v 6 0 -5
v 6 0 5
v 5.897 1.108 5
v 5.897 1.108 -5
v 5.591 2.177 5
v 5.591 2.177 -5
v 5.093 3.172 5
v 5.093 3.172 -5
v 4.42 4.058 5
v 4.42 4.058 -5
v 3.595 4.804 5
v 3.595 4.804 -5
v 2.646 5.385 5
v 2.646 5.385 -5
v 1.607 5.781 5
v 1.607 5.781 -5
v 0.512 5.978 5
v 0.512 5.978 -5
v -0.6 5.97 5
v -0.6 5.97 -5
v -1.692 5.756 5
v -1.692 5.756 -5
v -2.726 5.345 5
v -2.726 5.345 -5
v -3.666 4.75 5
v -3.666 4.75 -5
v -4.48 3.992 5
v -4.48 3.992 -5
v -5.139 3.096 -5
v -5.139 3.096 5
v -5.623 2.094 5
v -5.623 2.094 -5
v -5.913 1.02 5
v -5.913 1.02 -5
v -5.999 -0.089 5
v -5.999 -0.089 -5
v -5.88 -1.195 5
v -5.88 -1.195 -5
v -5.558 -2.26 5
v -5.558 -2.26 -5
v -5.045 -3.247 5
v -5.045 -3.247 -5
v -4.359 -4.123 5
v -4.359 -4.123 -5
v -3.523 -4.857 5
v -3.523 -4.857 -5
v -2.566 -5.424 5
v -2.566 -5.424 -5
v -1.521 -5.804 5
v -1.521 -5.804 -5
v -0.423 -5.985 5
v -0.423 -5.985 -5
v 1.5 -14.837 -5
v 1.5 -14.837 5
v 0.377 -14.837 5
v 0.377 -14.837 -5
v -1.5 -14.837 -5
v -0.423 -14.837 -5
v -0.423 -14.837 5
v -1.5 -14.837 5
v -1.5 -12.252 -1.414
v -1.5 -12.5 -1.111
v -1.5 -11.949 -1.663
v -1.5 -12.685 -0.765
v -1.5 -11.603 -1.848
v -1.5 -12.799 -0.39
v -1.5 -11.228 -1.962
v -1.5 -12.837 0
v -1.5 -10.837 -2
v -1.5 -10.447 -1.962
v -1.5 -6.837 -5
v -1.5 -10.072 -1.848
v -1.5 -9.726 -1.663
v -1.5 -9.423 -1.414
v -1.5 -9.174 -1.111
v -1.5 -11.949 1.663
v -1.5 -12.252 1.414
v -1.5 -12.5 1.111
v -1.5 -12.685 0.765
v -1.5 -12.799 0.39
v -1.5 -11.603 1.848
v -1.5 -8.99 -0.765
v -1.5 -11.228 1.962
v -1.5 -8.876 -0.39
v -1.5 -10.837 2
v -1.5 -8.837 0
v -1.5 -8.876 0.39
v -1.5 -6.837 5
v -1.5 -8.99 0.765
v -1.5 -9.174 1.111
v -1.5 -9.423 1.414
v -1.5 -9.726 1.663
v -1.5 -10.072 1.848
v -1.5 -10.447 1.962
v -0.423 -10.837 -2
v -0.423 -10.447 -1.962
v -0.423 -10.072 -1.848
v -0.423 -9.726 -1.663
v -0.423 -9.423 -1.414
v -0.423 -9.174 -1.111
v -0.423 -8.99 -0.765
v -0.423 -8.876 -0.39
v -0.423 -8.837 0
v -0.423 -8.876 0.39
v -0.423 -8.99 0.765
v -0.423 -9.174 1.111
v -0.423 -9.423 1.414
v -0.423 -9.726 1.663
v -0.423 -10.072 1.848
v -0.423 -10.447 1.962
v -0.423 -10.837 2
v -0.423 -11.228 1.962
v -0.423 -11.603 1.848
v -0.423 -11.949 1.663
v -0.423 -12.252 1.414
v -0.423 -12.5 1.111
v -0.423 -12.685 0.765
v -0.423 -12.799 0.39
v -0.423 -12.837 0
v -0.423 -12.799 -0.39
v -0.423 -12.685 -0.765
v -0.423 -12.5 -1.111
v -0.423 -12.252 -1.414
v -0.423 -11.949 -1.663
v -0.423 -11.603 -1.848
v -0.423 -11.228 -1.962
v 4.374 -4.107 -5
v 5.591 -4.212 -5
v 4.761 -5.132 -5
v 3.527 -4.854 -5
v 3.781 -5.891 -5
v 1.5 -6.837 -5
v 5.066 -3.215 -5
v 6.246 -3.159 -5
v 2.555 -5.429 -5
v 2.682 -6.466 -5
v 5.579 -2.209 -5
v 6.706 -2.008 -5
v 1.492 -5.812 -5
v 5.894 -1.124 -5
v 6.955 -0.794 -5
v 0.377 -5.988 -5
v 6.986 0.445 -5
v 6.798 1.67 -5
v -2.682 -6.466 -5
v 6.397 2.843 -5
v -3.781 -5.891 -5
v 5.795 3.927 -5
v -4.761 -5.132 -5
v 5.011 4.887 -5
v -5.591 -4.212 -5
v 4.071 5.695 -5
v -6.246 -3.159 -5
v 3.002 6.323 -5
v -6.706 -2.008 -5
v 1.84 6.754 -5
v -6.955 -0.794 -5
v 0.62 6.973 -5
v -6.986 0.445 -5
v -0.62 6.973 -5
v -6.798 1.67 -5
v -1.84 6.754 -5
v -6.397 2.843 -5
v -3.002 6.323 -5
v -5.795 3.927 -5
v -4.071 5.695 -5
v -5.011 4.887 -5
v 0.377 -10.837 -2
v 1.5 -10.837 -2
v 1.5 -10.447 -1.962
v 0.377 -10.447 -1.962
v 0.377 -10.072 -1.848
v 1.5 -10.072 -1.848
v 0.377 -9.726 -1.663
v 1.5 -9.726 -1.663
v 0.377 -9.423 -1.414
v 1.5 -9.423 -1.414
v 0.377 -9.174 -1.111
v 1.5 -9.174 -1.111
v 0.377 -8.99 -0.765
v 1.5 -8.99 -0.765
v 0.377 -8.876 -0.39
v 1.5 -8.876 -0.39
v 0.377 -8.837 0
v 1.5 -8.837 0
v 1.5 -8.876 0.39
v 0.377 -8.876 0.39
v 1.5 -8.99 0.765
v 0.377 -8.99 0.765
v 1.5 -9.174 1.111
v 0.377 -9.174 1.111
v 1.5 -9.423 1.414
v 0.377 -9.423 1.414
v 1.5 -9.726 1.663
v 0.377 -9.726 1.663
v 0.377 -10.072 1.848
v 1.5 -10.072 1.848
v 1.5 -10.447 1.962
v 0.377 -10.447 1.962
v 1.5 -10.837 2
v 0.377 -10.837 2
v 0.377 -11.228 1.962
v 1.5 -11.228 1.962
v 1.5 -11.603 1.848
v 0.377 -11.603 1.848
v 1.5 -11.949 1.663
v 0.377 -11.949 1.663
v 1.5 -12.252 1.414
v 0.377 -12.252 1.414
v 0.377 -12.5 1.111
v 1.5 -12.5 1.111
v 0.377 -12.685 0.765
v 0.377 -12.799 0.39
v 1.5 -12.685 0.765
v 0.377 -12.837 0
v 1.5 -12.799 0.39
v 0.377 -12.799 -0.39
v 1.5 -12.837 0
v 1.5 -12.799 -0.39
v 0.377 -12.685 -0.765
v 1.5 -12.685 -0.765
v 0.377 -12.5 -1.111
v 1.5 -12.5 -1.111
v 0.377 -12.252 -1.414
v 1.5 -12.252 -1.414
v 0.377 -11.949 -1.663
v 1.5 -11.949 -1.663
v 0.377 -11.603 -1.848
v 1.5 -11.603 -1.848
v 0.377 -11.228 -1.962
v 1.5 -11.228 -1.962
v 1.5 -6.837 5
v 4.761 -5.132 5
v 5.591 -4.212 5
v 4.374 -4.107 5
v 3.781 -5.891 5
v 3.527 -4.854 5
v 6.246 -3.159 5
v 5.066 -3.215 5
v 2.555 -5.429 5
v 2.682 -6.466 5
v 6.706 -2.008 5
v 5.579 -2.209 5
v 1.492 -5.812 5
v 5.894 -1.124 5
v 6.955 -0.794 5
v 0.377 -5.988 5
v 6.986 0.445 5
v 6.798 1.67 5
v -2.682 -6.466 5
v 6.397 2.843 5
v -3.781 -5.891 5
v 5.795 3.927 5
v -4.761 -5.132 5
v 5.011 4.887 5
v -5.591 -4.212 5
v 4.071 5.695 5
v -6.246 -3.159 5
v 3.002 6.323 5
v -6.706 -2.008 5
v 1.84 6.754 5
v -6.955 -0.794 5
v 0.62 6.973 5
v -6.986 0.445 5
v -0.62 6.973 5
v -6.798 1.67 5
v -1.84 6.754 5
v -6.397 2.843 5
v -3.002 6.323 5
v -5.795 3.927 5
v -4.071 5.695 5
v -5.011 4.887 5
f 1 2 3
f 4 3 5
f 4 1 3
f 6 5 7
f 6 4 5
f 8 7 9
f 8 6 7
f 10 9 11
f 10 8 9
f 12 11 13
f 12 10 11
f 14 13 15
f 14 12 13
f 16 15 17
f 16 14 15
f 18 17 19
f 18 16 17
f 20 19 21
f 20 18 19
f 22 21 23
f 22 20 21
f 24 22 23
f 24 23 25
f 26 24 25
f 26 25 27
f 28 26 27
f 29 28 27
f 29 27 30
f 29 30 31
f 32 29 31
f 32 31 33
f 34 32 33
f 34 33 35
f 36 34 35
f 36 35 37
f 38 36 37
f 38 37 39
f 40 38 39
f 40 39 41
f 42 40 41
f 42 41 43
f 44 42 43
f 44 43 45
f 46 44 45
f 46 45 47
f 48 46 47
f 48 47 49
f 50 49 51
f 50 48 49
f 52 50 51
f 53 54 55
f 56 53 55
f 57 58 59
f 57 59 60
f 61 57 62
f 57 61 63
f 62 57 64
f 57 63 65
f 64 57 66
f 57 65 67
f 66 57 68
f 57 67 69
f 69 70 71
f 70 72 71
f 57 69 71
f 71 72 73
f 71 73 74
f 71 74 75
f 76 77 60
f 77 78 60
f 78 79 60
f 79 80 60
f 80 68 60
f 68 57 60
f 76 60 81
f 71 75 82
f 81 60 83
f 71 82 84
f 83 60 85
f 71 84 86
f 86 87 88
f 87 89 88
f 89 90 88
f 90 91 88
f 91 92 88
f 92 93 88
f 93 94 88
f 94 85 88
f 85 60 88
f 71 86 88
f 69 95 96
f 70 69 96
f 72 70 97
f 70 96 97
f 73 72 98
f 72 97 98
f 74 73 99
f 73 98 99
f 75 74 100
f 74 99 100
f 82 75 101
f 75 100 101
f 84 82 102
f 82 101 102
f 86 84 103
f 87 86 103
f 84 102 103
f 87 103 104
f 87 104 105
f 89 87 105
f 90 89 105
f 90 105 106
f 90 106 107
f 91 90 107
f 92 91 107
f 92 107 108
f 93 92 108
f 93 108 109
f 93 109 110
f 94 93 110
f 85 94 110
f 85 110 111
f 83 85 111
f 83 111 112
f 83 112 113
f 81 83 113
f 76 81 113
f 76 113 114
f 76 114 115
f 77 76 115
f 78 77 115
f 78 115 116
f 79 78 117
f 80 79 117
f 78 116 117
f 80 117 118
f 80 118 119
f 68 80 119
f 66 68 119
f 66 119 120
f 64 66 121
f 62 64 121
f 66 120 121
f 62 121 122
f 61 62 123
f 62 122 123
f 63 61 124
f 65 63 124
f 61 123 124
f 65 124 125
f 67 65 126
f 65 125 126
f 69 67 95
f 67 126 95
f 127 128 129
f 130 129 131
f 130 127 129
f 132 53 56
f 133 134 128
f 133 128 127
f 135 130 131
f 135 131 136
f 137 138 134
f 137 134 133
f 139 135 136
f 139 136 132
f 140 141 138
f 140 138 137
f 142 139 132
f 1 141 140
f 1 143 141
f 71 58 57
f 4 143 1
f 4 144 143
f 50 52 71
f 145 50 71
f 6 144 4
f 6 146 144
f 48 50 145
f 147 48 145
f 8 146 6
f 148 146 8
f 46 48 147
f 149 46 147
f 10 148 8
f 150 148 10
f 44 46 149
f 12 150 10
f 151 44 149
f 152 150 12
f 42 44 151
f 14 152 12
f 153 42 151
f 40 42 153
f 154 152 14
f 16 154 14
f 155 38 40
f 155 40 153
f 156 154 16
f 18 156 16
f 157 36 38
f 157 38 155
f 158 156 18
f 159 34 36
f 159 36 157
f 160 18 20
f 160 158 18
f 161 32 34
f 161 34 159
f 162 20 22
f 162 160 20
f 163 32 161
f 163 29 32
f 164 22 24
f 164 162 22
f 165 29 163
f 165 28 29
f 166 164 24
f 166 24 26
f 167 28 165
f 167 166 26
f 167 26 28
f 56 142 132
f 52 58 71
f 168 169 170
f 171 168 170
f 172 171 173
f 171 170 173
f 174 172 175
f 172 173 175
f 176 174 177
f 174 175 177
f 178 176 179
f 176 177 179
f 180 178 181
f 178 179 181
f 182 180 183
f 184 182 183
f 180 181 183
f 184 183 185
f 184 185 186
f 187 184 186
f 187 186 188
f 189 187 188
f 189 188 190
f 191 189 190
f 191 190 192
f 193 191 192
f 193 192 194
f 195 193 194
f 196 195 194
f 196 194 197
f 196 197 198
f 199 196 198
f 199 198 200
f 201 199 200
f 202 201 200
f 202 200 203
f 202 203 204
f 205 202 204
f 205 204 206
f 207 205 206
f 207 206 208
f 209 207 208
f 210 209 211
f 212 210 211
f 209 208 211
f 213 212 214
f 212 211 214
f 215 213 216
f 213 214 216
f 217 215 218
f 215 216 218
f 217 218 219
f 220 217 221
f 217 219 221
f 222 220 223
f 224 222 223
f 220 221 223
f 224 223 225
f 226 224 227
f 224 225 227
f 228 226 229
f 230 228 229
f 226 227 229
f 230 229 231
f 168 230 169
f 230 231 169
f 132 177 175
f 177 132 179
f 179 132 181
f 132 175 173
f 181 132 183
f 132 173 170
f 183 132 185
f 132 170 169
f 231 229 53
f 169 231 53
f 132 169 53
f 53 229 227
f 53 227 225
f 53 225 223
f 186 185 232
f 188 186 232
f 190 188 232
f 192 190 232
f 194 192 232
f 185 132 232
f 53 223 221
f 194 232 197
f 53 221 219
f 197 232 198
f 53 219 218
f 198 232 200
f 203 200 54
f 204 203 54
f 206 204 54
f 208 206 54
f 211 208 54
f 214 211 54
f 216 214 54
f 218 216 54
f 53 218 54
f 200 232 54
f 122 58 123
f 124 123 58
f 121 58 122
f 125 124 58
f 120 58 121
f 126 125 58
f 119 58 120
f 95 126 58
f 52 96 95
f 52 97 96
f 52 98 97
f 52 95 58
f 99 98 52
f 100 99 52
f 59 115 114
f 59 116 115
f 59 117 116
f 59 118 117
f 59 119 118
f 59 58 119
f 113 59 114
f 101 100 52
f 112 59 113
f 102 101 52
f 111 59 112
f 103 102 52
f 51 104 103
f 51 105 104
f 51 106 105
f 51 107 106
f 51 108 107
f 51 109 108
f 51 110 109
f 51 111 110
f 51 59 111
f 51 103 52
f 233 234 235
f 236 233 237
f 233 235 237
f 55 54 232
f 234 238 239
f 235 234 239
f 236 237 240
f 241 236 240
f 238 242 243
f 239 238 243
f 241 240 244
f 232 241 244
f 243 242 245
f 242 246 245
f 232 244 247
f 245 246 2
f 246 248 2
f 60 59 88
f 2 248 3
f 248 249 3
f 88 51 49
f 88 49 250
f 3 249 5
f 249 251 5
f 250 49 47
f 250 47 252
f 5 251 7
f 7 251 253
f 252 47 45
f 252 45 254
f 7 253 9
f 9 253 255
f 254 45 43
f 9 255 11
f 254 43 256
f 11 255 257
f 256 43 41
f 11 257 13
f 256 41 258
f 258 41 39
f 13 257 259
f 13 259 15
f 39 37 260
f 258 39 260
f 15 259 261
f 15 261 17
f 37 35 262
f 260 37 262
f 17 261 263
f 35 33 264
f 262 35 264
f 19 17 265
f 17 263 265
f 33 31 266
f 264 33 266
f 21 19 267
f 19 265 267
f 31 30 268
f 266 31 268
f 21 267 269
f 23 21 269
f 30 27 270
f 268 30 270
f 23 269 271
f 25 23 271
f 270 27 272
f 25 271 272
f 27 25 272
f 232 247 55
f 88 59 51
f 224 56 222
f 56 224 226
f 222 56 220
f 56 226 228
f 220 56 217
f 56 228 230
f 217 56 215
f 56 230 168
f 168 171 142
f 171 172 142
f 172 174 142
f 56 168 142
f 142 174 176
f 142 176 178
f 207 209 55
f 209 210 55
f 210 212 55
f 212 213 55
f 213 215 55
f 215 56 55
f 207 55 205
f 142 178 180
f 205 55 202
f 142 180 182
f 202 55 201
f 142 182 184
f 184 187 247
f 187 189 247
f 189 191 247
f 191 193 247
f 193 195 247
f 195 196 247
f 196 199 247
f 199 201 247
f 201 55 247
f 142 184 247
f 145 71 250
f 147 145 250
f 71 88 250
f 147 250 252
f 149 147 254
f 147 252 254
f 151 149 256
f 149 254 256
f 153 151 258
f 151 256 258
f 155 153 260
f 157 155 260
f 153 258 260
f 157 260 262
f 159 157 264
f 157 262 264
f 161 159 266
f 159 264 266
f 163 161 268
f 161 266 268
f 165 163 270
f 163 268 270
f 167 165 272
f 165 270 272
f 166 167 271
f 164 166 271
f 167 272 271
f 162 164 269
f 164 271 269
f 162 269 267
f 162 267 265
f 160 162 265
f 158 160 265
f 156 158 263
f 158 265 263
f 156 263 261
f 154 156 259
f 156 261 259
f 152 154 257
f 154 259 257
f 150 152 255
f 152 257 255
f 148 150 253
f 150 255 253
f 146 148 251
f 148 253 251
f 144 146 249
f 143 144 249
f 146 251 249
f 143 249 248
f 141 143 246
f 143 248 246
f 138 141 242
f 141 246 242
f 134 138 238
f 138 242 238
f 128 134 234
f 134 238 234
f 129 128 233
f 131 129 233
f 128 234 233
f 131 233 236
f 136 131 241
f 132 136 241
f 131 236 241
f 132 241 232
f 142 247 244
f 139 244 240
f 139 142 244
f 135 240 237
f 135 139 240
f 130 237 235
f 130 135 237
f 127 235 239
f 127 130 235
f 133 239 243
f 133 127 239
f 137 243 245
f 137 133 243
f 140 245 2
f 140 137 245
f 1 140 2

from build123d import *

# Parameters (mm, degrees)
SKETCH1_R                 = 6
BOSS_EXTRUDE1_DEPTH       = 5
SKETCH2_W                 = 0.799850041
SKETCH2_H                 = 15.18552409
CUT_EXTRUDE1_DEPTH        = 20.213233842
F_4_0MM_DOWEL_HOLE1_D     = 4
F_4_0MM_DOWEL_HOLE1_DEPTH = 32.5
F_4_0MM_DOWEL_HOLE1_TIP   = 1.201721238


with BuildPart() as part:
    # Sketch1 → Boss-Extrude1 (new, symmetric)
    with BuildSketch(Plane.XY):
        with BuildLine():
            Line((1.5, -14.837397166), (-1.5, -14.837397166))
            Line((-1.5, -14.837397166), (-1.5, -6.837397166))
            ThreePointArc((-1.5, -6.837397166), (0, 7), (1.5, -6.837397166))
            Line((1.5, -6.837397166), (1.5, -14.837397166))
        make_face()
        Circle(SKETCH1_R, mode=Mode.SUBTRACT)
    extrude(amount=BOSS_EXTRUDE1_DEPTH, both=True)

    # Sketch2 → Cut-Extrude1 (cut, through all)
    with BuildSketch(Plane.XY.offset(5)):
        with Locations((-0.023277633, -7.592762045)):
            Rectangle(SKETCH2_W, SKETCH2_H)
    extrude(amount=-CUT_EXTRUDE1_DEPTH, mode=Mode.SUBTRACT)

    # Ø4.0mm Dowel Hole1
    with Locations(Plane.ZY.offset(1.5)):
        with Locations((0, -10.837397166)):
            Hole(F_4_0MM_DOWEL_HOLE1_D / 2, depth=F_4_0MM_DOWEL_HOLE1_DEPTH)
            with Locations((0, 0, -(F_4_0MM_DOWEL_HOLE1_DEPTH + F_4_0MM_DOWEL_HOLE1_TIP / 2))):  # 118° drill point
                Cone(0, F_4_0MM_DOWEL_HOLE1_D / 2, F_4_0MM_DOWEL_HOLE1_TIP, mode=Mode.SUBTRACT)


solid = part.part
